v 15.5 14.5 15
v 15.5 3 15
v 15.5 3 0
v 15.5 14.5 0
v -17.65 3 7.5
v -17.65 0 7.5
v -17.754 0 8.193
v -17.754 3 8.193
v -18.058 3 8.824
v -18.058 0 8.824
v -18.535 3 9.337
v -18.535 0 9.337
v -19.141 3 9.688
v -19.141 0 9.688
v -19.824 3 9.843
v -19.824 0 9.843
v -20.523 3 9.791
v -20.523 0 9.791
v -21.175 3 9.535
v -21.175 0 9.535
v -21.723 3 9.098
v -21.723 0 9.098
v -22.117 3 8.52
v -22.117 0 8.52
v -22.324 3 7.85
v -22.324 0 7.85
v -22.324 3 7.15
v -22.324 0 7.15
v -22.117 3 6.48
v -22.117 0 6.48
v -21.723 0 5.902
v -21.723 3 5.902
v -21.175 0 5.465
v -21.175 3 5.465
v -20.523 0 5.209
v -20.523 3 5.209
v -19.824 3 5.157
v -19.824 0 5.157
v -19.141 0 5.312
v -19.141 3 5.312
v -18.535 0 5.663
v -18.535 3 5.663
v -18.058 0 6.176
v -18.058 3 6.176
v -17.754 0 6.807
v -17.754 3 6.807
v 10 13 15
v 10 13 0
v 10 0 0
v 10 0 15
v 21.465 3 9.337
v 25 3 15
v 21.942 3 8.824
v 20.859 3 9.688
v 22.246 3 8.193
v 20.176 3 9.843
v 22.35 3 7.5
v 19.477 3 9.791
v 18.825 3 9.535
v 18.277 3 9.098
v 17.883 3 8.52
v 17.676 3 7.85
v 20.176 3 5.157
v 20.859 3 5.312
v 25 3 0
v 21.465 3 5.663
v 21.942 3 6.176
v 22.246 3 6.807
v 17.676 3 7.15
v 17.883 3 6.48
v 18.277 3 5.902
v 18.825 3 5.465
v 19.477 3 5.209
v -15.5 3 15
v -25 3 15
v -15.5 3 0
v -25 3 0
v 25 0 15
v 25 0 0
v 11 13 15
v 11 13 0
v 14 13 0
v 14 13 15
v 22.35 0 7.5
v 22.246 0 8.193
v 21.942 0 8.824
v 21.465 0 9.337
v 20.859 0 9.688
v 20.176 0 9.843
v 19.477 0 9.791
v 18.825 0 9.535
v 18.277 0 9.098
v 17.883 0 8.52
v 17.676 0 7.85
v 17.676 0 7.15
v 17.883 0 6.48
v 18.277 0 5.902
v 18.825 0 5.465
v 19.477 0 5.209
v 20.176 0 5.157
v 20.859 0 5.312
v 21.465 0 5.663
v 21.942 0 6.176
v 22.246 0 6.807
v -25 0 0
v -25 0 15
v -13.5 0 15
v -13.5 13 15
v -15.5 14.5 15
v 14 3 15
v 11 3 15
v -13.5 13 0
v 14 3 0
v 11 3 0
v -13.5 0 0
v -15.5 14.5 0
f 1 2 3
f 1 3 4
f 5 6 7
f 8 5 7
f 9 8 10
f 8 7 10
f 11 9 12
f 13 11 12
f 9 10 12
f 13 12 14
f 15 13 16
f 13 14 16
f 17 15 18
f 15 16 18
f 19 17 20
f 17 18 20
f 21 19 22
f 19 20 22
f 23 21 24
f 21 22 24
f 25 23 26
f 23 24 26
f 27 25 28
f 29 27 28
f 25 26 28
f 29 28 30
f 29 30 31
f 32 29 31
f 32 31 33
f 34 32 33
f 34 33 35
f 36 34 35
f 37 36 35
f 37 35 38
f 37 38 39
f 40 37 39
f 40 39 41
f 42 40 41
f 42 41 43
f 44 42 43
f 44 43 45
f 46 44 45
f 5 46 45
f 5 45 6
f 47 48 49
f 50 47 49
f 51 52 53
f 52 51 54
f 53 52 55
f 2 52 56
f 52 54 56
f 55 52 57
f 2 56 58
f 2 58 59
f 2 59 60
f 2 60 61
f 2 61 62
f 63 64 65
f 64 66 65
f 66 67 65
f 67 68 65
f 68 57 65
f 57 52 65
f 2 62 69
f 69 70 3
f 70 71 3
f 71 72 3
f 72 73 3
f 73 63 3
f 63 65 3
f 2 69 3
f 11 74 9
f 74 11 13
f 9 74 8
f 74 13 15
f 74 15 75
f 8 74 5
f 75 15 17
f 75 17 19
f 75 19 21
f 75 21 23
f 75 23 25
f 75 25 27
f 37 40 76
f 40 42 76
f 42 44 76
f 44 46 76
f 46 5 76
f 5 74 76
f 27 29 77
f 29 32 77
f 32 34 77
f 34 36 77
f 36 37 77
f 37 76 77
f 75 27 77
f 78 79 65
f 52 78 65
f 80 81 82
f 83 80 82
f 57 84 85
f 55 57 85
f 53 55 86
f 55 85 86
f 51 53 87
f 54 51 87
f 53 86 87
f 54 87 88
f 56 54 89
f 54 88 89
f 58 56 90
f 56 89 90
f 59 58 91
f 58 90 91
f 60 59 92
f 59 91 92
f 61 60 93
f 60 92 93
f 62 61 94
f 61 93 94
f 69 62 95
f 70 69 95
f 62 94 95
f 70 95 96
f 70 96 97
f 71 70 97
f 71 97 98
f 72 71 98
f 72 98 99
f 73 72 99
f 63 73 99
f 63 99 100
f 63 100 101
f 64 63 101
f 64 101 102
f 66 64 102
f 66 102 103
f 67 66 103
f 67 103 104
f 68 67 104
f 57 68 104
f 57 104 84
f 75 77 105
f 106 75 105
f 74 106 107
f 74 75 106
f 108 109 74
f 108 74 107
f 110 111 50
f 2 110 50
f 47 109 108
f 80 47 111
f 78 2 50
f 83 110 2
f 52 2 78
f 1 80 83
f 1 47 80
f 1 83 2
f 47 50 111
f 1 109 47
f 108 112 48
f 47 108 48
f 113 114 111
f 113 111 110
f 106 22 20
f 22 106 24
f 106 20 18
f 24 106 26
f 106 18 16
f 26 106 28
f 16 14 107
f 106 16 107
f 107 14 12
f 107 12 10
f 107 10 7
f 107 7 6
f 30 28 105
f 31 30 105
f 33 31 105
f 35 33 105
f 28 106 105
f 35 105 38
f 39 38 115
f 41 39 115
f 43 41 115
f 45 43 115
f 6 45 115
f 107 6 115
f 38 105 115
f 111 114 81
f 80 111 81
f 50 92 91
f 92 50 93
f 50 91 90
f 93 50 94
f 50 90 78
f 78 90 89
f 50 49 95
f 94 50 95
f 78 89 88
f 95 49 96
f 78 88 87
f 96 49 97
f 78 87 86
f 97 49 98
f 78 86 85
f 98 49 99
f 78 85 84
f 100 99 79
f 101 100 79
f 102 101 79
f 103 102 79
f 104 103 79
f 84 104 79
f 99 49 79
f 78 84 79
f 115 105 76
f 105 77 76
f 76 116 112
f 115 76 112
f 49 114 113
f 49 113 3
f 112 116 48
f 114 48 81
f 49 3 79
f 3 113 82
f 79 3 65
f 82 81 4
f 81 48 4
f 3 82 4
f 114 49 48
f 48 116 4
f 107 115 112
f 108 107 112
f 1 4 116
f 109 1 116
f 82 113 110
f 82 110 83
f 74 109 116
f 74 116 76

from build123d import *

# Parameters (mm, degrees)
SKETCH001_AS_DRAWN_R                 = 2.35
EXTRUDE001_DEPTH                     = 5
EXTRUDE001_ONTO_SKETCH001_ROLL_ANGLE = 90
SKETCH_W                             = 3
SKETCH_H                             = 10
EXTRUDE_DEPTH                        = 15


with BuildPart() as extrude001:
    # Sketch001 as drawn → Extrude001 (new)
    with BuildSketch(Plane.XY):
        with Locations((-20, 7.5)):
            Circle(SKETCH001_AS_DRAWN_R)
        with Locations((20, 7.5)):
            Circle(SKETCH001_AS_DRAWN_R)
    extrude(amount=-EXTRUDE001_DEPTH)


with BuildPart() as extrude001_1:
    # Extrude001 onto Sketch001 roll: moved
    add(extrude001.part.rotate(Axis((0, 0, 0), (1, 0, 0)), EXTRUDE001_ONTO_SKETCH001_ROLL_ANGLE))


with BuildPart() as extrude001_2:
    # Extrude001 onto Sketch001 placement: moved
    add(extrude001_1.part)


with BuildPart() as cut:
    # Sketch → Extrude (new body)
    with BuildSketch(Plane.XY):
        Polygon((-25, 0), (-13.5, 0), (-13.5, 13), (10, 13), (10, 0), (25, 0), (25, 3), (15.5, 3), (15.5, 14.5), (-15.5, 14.5), (-15.5, 3), (-25, 3), align=None)
        with Locations((12.5, 8)):
            Rectangle(SKETCH_W, SKETCH_H, mode=Mode.SUBTRACT)
    extrude(amount=EXTRUDE_DEPTH)

    # Cut: cut Extrude001
    add(extrude001_2.part, mode=Mode.SUBTRACT)


solid = cut.part
